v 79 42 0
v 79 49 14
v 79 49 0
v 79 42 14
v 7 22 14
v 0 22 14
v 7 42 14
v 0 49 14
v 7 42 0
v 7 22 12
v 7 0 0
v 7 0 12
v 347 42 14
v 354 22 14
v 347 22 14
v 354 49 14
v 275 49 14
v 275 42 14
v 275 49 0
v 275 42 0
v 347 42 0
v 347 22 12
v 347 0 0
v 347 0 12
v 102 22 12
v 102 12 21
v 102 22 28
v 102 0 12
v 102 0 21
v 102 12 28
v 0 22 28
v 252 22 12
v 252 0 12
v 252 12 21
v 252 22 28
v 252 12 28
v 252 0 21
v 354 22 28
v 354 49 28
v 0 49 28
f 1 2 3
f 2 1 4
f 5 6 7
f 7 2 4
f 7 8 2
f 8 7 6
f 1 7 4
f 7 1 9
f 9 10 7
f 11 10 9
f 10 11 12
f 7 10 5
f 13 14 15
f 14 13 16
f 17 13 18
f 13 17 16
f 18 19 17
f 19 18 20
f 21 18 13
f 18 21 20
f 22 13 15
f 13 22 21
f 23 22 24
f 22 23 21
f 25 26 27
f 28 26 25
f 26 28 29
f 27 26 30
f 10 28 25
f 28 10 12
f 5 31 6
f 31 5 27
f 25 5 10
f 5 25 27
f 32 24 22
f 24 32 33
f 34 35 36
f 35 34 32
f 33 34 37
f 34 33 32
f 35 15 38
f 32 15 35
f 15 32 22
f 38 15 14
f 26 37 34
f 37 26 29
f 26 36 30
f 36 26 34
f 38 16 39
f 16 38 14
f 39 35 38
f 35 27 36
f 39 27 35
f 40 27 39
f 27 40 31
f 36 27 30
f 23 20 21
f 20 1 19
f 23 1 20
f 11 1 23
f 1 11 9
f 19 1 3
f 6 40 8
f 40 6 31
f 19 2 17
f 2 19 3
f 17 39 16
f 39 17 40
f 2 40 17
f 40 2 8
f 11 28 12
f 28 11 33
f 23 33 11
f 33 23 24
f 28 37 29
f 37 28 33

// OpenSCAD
include <../src/wardrobe.scad>;
plank_xy_top(wardrobe_n);
//github_openscad -o wardrobe_1/plank_xy_top.stl -D wardrobe_n=1 -D cutting_edge=0 -D break_view_length=0 wardrobe_1/plank_xy_top_stl.scad
